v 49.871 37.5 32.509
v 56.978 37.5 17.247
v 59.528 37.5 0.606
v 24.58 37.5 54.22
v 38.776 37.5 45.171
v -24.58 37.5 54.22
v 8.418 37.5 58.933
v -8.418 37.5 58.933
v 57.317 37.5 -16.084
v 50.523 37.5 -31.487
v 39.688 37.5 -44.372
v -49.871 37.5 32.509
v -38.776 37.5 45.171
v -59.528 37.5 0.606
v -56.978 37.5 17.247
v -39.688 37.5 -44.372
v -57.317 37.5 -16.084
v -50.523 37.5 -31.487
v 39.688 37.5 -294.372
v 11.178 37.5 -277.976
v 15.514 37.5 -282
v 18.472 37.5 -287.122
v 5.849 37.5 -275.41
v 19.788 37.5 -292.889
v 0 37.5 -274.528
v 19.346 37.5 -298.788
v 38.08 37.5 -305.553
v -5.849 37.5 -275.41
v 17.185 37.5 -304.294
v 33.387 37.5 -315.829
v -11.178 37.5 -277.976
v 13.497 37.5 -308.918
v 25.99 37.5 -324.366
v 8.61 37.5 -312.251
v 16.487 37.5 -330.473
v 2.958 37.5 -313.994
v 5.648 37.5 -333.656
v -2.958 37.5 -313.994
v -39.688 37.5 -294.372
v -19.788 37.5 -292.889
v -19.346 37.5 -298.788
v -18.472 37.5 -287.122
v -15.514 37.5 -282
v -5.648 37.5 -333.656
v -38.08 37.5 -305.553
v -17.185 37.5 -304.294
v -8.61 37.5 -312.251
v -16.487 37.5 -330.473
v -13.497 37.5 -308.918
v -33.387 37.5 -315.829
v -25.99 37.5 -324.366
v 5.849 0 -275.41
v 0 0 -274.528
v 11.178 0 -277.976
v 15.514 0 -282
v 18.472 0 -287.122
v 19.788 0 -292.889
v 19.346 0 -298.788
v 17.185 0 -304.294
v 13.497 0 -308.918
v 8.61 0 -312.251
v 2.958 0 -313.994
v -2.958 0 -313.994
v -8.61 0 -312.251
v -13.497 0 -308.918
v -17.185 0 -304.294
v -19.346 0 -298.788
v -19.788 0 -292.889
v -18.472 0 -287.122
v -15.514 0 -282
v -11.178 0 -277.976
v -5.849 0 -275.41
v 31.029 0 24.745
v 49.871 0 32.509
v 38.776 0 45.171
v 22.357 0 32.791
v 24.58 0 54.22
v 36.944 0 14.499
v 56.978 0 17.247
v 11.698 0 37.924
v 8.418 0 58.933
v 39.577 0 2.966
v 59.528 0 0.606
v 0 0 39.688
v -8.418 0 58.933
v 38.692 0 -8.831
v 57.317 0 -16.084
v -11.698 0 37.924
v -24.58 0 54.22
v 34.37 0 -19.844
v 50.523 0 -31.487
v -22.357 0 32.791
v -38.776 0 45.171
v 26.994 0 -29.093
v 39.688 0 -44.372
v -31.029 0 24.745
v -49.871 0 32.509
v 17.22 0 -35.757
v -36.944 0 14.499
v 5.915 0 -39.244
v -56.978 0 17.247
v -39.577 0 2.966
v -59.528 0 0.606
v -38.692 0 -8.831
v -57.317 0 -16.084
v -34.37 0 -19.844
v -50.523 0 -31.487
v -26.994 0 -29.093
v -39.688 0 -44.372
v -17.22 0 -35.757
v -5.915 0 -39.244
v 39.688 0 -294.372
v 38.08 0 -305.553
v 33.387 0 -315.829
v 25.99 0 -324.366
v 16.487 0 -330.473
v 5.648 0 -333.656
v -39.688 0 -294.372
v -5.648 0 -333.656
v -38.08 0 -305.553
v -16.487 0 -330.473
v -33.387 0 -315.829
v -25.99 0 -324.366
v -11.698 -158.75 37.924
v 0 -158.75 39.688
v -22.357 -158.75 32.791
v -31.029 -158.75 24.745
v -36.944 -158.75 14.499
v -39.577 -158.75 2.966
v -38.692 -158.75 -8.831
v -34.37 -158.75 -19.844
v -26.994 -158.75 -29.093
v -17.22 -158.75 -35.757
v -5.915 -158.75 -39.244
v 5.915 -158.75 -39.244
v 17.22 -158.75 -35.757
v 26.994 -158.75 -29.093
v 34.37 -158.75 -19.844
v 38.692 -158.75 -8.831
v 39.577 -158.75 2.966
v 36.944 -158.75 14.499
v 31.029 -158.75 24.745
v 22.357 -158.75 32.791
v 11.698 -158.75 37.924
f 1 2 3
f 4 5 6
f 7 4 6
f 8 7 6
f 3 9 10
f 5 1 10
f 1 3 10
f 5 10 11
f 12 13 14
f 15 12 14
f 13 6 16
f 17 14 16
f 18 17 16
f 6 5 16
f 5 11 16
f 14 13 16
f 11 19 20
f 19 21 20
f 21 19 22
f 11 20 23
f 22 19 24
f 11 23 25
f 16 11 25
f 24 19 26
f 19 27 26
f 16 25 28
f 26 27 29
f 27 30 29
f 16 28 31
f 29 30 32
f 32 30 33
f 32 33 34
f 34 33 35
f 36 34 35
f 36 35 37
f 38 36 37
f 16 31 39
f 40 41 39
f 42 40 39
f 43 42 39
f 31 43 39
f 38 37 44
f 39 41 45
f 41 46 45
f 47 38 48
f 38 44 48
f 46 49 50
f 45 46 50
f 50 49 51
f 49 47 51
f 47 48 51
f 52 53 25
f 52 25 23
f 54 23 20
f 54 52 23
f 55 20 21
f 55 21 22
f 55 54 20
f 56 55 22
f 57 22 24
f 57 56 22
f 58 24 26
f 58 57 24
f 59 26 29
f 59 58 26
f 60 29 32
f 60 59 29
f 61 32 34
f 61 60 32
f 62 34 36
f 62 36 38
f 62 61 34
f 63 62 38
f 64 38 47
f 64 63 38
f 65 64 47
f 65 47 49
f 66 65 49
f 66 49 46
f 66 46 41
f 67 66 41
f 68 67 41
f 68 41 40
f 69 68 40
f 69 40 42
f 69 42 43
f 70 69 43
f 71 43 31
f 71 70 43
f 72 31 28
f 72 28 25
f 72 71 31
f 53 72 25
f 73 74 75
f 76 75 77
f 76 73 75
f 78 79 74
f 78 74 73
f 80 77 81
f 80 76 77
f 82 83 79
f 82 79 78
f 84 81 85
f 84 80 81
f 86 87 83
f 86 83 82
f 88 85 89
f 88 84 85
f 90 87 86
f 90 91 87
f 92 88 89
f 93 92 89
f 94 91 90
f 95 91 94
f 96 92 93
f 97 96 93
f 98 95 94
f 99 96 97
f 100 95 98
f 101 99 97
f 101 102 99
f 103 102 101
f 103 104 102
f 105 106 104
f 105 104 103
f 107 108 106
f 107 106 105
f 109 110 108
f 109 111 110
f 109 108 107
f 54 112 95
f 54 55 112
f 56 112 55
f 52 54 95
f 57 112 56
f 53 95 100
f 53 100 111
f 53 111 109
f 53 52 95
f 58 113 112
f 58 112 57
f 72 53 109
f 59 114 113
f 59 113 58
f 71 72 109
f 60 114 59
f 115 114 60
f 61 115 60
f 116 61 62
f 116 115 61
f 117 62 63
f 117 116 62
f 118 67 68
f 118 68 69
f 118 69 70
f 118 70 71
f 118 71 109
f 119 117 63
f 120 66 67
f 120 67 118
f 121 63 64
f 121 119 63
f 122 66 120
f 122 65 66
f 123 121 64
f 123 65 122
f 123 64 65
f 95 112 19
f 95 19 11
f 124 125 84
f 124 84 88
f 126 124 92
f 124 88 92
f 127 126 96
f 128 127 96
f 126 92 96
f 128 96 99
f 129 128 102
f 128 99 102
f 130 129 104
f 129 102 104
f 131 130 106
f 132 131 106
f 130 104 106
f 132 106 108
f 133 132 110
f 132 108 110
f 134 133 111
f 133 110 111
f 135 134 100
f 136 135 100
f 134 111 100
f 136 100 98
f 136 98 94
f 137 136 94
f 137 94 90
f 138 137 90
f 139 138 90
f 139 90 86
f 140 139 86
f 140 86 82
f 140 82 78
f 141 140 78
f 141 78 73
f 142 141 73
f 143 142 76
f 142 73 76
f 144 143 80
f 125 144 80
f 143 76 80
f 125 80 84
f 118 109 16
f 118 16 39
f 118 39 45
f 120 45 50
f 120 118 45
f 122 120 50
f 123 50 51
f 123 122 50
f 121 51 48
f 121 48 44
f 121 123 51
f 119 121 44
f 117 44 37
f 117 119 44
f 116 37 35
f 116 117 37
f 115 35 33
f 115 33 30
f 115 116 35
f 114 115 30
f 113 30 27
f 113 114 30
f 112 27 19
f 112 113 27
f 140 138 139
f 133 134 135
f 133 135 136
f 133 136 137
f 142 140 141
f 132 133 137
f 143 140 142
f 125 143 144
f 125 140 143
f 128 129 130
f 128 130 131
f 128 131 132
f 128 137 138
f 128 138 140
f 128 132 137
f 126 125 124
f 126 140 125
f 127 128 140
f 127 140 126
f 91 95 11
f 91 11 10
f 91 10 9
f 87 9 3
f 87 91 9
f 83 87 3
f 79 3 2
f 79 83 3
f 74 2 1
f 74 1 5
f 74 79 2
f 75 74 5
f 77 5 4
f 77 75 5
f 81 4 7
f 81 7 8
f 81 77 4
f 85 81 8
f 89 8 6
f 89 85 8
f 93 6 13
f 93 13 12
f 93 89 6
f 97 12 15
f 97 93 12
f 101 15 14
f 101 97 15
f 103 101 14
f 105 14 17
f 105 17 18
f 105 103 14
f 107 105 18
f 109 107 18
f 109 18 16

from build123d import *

# Parameters (mm, degrees)
SKETCH1_R           = 19.84375
BOSS_EXTRUDE1_DEPTH = 37.5
SKETCH2_R           = 39.6875
BOSS_EXTRUDE2_DEPTH = 158.75


with BuildPart() as part:
    # Sketch1 → Boss-Extrude1 (new body)
    with BuildSketch(Plane(origin=(0, 0, 0), x_dir=(1, 0, 0), z_dir=(0, 1, 0))):
        with BuildLine():
            Line((-39.6875, 44.371973929), (-39.6875, 294.371973929))
            ThreePointArc((-39.6875, 294.371973929), (0, 334.059473929), (39.6875, 294.371973929))
            Line((39.6875, 294.371973929), (39.6875, 44.371973929))
            ThreePointArc((39.6875, 44.371973929), (0, -59.53125), (-39.6875, 44.371973929))
        make_face()
        with Locations(Location((0, 294.371973929, 0), (0, 0, 270))):
            Circle(SKETCH1_R, mode=Mode.SUBTRACT)
    extrude(amount=BOSS_EXTRUDE1_DEPTH)

    # Sketch2 → Boss-Extrude2 (add)
    with BuildSketch(Plane.XZ):
        with Locations(Location((0, 0, 0), (0, 0, 90))):
            Circle(SKETCH2_R)
    extrude(amount=BOSS_EXTRUDE2_DEPTH)


solid = part.part
